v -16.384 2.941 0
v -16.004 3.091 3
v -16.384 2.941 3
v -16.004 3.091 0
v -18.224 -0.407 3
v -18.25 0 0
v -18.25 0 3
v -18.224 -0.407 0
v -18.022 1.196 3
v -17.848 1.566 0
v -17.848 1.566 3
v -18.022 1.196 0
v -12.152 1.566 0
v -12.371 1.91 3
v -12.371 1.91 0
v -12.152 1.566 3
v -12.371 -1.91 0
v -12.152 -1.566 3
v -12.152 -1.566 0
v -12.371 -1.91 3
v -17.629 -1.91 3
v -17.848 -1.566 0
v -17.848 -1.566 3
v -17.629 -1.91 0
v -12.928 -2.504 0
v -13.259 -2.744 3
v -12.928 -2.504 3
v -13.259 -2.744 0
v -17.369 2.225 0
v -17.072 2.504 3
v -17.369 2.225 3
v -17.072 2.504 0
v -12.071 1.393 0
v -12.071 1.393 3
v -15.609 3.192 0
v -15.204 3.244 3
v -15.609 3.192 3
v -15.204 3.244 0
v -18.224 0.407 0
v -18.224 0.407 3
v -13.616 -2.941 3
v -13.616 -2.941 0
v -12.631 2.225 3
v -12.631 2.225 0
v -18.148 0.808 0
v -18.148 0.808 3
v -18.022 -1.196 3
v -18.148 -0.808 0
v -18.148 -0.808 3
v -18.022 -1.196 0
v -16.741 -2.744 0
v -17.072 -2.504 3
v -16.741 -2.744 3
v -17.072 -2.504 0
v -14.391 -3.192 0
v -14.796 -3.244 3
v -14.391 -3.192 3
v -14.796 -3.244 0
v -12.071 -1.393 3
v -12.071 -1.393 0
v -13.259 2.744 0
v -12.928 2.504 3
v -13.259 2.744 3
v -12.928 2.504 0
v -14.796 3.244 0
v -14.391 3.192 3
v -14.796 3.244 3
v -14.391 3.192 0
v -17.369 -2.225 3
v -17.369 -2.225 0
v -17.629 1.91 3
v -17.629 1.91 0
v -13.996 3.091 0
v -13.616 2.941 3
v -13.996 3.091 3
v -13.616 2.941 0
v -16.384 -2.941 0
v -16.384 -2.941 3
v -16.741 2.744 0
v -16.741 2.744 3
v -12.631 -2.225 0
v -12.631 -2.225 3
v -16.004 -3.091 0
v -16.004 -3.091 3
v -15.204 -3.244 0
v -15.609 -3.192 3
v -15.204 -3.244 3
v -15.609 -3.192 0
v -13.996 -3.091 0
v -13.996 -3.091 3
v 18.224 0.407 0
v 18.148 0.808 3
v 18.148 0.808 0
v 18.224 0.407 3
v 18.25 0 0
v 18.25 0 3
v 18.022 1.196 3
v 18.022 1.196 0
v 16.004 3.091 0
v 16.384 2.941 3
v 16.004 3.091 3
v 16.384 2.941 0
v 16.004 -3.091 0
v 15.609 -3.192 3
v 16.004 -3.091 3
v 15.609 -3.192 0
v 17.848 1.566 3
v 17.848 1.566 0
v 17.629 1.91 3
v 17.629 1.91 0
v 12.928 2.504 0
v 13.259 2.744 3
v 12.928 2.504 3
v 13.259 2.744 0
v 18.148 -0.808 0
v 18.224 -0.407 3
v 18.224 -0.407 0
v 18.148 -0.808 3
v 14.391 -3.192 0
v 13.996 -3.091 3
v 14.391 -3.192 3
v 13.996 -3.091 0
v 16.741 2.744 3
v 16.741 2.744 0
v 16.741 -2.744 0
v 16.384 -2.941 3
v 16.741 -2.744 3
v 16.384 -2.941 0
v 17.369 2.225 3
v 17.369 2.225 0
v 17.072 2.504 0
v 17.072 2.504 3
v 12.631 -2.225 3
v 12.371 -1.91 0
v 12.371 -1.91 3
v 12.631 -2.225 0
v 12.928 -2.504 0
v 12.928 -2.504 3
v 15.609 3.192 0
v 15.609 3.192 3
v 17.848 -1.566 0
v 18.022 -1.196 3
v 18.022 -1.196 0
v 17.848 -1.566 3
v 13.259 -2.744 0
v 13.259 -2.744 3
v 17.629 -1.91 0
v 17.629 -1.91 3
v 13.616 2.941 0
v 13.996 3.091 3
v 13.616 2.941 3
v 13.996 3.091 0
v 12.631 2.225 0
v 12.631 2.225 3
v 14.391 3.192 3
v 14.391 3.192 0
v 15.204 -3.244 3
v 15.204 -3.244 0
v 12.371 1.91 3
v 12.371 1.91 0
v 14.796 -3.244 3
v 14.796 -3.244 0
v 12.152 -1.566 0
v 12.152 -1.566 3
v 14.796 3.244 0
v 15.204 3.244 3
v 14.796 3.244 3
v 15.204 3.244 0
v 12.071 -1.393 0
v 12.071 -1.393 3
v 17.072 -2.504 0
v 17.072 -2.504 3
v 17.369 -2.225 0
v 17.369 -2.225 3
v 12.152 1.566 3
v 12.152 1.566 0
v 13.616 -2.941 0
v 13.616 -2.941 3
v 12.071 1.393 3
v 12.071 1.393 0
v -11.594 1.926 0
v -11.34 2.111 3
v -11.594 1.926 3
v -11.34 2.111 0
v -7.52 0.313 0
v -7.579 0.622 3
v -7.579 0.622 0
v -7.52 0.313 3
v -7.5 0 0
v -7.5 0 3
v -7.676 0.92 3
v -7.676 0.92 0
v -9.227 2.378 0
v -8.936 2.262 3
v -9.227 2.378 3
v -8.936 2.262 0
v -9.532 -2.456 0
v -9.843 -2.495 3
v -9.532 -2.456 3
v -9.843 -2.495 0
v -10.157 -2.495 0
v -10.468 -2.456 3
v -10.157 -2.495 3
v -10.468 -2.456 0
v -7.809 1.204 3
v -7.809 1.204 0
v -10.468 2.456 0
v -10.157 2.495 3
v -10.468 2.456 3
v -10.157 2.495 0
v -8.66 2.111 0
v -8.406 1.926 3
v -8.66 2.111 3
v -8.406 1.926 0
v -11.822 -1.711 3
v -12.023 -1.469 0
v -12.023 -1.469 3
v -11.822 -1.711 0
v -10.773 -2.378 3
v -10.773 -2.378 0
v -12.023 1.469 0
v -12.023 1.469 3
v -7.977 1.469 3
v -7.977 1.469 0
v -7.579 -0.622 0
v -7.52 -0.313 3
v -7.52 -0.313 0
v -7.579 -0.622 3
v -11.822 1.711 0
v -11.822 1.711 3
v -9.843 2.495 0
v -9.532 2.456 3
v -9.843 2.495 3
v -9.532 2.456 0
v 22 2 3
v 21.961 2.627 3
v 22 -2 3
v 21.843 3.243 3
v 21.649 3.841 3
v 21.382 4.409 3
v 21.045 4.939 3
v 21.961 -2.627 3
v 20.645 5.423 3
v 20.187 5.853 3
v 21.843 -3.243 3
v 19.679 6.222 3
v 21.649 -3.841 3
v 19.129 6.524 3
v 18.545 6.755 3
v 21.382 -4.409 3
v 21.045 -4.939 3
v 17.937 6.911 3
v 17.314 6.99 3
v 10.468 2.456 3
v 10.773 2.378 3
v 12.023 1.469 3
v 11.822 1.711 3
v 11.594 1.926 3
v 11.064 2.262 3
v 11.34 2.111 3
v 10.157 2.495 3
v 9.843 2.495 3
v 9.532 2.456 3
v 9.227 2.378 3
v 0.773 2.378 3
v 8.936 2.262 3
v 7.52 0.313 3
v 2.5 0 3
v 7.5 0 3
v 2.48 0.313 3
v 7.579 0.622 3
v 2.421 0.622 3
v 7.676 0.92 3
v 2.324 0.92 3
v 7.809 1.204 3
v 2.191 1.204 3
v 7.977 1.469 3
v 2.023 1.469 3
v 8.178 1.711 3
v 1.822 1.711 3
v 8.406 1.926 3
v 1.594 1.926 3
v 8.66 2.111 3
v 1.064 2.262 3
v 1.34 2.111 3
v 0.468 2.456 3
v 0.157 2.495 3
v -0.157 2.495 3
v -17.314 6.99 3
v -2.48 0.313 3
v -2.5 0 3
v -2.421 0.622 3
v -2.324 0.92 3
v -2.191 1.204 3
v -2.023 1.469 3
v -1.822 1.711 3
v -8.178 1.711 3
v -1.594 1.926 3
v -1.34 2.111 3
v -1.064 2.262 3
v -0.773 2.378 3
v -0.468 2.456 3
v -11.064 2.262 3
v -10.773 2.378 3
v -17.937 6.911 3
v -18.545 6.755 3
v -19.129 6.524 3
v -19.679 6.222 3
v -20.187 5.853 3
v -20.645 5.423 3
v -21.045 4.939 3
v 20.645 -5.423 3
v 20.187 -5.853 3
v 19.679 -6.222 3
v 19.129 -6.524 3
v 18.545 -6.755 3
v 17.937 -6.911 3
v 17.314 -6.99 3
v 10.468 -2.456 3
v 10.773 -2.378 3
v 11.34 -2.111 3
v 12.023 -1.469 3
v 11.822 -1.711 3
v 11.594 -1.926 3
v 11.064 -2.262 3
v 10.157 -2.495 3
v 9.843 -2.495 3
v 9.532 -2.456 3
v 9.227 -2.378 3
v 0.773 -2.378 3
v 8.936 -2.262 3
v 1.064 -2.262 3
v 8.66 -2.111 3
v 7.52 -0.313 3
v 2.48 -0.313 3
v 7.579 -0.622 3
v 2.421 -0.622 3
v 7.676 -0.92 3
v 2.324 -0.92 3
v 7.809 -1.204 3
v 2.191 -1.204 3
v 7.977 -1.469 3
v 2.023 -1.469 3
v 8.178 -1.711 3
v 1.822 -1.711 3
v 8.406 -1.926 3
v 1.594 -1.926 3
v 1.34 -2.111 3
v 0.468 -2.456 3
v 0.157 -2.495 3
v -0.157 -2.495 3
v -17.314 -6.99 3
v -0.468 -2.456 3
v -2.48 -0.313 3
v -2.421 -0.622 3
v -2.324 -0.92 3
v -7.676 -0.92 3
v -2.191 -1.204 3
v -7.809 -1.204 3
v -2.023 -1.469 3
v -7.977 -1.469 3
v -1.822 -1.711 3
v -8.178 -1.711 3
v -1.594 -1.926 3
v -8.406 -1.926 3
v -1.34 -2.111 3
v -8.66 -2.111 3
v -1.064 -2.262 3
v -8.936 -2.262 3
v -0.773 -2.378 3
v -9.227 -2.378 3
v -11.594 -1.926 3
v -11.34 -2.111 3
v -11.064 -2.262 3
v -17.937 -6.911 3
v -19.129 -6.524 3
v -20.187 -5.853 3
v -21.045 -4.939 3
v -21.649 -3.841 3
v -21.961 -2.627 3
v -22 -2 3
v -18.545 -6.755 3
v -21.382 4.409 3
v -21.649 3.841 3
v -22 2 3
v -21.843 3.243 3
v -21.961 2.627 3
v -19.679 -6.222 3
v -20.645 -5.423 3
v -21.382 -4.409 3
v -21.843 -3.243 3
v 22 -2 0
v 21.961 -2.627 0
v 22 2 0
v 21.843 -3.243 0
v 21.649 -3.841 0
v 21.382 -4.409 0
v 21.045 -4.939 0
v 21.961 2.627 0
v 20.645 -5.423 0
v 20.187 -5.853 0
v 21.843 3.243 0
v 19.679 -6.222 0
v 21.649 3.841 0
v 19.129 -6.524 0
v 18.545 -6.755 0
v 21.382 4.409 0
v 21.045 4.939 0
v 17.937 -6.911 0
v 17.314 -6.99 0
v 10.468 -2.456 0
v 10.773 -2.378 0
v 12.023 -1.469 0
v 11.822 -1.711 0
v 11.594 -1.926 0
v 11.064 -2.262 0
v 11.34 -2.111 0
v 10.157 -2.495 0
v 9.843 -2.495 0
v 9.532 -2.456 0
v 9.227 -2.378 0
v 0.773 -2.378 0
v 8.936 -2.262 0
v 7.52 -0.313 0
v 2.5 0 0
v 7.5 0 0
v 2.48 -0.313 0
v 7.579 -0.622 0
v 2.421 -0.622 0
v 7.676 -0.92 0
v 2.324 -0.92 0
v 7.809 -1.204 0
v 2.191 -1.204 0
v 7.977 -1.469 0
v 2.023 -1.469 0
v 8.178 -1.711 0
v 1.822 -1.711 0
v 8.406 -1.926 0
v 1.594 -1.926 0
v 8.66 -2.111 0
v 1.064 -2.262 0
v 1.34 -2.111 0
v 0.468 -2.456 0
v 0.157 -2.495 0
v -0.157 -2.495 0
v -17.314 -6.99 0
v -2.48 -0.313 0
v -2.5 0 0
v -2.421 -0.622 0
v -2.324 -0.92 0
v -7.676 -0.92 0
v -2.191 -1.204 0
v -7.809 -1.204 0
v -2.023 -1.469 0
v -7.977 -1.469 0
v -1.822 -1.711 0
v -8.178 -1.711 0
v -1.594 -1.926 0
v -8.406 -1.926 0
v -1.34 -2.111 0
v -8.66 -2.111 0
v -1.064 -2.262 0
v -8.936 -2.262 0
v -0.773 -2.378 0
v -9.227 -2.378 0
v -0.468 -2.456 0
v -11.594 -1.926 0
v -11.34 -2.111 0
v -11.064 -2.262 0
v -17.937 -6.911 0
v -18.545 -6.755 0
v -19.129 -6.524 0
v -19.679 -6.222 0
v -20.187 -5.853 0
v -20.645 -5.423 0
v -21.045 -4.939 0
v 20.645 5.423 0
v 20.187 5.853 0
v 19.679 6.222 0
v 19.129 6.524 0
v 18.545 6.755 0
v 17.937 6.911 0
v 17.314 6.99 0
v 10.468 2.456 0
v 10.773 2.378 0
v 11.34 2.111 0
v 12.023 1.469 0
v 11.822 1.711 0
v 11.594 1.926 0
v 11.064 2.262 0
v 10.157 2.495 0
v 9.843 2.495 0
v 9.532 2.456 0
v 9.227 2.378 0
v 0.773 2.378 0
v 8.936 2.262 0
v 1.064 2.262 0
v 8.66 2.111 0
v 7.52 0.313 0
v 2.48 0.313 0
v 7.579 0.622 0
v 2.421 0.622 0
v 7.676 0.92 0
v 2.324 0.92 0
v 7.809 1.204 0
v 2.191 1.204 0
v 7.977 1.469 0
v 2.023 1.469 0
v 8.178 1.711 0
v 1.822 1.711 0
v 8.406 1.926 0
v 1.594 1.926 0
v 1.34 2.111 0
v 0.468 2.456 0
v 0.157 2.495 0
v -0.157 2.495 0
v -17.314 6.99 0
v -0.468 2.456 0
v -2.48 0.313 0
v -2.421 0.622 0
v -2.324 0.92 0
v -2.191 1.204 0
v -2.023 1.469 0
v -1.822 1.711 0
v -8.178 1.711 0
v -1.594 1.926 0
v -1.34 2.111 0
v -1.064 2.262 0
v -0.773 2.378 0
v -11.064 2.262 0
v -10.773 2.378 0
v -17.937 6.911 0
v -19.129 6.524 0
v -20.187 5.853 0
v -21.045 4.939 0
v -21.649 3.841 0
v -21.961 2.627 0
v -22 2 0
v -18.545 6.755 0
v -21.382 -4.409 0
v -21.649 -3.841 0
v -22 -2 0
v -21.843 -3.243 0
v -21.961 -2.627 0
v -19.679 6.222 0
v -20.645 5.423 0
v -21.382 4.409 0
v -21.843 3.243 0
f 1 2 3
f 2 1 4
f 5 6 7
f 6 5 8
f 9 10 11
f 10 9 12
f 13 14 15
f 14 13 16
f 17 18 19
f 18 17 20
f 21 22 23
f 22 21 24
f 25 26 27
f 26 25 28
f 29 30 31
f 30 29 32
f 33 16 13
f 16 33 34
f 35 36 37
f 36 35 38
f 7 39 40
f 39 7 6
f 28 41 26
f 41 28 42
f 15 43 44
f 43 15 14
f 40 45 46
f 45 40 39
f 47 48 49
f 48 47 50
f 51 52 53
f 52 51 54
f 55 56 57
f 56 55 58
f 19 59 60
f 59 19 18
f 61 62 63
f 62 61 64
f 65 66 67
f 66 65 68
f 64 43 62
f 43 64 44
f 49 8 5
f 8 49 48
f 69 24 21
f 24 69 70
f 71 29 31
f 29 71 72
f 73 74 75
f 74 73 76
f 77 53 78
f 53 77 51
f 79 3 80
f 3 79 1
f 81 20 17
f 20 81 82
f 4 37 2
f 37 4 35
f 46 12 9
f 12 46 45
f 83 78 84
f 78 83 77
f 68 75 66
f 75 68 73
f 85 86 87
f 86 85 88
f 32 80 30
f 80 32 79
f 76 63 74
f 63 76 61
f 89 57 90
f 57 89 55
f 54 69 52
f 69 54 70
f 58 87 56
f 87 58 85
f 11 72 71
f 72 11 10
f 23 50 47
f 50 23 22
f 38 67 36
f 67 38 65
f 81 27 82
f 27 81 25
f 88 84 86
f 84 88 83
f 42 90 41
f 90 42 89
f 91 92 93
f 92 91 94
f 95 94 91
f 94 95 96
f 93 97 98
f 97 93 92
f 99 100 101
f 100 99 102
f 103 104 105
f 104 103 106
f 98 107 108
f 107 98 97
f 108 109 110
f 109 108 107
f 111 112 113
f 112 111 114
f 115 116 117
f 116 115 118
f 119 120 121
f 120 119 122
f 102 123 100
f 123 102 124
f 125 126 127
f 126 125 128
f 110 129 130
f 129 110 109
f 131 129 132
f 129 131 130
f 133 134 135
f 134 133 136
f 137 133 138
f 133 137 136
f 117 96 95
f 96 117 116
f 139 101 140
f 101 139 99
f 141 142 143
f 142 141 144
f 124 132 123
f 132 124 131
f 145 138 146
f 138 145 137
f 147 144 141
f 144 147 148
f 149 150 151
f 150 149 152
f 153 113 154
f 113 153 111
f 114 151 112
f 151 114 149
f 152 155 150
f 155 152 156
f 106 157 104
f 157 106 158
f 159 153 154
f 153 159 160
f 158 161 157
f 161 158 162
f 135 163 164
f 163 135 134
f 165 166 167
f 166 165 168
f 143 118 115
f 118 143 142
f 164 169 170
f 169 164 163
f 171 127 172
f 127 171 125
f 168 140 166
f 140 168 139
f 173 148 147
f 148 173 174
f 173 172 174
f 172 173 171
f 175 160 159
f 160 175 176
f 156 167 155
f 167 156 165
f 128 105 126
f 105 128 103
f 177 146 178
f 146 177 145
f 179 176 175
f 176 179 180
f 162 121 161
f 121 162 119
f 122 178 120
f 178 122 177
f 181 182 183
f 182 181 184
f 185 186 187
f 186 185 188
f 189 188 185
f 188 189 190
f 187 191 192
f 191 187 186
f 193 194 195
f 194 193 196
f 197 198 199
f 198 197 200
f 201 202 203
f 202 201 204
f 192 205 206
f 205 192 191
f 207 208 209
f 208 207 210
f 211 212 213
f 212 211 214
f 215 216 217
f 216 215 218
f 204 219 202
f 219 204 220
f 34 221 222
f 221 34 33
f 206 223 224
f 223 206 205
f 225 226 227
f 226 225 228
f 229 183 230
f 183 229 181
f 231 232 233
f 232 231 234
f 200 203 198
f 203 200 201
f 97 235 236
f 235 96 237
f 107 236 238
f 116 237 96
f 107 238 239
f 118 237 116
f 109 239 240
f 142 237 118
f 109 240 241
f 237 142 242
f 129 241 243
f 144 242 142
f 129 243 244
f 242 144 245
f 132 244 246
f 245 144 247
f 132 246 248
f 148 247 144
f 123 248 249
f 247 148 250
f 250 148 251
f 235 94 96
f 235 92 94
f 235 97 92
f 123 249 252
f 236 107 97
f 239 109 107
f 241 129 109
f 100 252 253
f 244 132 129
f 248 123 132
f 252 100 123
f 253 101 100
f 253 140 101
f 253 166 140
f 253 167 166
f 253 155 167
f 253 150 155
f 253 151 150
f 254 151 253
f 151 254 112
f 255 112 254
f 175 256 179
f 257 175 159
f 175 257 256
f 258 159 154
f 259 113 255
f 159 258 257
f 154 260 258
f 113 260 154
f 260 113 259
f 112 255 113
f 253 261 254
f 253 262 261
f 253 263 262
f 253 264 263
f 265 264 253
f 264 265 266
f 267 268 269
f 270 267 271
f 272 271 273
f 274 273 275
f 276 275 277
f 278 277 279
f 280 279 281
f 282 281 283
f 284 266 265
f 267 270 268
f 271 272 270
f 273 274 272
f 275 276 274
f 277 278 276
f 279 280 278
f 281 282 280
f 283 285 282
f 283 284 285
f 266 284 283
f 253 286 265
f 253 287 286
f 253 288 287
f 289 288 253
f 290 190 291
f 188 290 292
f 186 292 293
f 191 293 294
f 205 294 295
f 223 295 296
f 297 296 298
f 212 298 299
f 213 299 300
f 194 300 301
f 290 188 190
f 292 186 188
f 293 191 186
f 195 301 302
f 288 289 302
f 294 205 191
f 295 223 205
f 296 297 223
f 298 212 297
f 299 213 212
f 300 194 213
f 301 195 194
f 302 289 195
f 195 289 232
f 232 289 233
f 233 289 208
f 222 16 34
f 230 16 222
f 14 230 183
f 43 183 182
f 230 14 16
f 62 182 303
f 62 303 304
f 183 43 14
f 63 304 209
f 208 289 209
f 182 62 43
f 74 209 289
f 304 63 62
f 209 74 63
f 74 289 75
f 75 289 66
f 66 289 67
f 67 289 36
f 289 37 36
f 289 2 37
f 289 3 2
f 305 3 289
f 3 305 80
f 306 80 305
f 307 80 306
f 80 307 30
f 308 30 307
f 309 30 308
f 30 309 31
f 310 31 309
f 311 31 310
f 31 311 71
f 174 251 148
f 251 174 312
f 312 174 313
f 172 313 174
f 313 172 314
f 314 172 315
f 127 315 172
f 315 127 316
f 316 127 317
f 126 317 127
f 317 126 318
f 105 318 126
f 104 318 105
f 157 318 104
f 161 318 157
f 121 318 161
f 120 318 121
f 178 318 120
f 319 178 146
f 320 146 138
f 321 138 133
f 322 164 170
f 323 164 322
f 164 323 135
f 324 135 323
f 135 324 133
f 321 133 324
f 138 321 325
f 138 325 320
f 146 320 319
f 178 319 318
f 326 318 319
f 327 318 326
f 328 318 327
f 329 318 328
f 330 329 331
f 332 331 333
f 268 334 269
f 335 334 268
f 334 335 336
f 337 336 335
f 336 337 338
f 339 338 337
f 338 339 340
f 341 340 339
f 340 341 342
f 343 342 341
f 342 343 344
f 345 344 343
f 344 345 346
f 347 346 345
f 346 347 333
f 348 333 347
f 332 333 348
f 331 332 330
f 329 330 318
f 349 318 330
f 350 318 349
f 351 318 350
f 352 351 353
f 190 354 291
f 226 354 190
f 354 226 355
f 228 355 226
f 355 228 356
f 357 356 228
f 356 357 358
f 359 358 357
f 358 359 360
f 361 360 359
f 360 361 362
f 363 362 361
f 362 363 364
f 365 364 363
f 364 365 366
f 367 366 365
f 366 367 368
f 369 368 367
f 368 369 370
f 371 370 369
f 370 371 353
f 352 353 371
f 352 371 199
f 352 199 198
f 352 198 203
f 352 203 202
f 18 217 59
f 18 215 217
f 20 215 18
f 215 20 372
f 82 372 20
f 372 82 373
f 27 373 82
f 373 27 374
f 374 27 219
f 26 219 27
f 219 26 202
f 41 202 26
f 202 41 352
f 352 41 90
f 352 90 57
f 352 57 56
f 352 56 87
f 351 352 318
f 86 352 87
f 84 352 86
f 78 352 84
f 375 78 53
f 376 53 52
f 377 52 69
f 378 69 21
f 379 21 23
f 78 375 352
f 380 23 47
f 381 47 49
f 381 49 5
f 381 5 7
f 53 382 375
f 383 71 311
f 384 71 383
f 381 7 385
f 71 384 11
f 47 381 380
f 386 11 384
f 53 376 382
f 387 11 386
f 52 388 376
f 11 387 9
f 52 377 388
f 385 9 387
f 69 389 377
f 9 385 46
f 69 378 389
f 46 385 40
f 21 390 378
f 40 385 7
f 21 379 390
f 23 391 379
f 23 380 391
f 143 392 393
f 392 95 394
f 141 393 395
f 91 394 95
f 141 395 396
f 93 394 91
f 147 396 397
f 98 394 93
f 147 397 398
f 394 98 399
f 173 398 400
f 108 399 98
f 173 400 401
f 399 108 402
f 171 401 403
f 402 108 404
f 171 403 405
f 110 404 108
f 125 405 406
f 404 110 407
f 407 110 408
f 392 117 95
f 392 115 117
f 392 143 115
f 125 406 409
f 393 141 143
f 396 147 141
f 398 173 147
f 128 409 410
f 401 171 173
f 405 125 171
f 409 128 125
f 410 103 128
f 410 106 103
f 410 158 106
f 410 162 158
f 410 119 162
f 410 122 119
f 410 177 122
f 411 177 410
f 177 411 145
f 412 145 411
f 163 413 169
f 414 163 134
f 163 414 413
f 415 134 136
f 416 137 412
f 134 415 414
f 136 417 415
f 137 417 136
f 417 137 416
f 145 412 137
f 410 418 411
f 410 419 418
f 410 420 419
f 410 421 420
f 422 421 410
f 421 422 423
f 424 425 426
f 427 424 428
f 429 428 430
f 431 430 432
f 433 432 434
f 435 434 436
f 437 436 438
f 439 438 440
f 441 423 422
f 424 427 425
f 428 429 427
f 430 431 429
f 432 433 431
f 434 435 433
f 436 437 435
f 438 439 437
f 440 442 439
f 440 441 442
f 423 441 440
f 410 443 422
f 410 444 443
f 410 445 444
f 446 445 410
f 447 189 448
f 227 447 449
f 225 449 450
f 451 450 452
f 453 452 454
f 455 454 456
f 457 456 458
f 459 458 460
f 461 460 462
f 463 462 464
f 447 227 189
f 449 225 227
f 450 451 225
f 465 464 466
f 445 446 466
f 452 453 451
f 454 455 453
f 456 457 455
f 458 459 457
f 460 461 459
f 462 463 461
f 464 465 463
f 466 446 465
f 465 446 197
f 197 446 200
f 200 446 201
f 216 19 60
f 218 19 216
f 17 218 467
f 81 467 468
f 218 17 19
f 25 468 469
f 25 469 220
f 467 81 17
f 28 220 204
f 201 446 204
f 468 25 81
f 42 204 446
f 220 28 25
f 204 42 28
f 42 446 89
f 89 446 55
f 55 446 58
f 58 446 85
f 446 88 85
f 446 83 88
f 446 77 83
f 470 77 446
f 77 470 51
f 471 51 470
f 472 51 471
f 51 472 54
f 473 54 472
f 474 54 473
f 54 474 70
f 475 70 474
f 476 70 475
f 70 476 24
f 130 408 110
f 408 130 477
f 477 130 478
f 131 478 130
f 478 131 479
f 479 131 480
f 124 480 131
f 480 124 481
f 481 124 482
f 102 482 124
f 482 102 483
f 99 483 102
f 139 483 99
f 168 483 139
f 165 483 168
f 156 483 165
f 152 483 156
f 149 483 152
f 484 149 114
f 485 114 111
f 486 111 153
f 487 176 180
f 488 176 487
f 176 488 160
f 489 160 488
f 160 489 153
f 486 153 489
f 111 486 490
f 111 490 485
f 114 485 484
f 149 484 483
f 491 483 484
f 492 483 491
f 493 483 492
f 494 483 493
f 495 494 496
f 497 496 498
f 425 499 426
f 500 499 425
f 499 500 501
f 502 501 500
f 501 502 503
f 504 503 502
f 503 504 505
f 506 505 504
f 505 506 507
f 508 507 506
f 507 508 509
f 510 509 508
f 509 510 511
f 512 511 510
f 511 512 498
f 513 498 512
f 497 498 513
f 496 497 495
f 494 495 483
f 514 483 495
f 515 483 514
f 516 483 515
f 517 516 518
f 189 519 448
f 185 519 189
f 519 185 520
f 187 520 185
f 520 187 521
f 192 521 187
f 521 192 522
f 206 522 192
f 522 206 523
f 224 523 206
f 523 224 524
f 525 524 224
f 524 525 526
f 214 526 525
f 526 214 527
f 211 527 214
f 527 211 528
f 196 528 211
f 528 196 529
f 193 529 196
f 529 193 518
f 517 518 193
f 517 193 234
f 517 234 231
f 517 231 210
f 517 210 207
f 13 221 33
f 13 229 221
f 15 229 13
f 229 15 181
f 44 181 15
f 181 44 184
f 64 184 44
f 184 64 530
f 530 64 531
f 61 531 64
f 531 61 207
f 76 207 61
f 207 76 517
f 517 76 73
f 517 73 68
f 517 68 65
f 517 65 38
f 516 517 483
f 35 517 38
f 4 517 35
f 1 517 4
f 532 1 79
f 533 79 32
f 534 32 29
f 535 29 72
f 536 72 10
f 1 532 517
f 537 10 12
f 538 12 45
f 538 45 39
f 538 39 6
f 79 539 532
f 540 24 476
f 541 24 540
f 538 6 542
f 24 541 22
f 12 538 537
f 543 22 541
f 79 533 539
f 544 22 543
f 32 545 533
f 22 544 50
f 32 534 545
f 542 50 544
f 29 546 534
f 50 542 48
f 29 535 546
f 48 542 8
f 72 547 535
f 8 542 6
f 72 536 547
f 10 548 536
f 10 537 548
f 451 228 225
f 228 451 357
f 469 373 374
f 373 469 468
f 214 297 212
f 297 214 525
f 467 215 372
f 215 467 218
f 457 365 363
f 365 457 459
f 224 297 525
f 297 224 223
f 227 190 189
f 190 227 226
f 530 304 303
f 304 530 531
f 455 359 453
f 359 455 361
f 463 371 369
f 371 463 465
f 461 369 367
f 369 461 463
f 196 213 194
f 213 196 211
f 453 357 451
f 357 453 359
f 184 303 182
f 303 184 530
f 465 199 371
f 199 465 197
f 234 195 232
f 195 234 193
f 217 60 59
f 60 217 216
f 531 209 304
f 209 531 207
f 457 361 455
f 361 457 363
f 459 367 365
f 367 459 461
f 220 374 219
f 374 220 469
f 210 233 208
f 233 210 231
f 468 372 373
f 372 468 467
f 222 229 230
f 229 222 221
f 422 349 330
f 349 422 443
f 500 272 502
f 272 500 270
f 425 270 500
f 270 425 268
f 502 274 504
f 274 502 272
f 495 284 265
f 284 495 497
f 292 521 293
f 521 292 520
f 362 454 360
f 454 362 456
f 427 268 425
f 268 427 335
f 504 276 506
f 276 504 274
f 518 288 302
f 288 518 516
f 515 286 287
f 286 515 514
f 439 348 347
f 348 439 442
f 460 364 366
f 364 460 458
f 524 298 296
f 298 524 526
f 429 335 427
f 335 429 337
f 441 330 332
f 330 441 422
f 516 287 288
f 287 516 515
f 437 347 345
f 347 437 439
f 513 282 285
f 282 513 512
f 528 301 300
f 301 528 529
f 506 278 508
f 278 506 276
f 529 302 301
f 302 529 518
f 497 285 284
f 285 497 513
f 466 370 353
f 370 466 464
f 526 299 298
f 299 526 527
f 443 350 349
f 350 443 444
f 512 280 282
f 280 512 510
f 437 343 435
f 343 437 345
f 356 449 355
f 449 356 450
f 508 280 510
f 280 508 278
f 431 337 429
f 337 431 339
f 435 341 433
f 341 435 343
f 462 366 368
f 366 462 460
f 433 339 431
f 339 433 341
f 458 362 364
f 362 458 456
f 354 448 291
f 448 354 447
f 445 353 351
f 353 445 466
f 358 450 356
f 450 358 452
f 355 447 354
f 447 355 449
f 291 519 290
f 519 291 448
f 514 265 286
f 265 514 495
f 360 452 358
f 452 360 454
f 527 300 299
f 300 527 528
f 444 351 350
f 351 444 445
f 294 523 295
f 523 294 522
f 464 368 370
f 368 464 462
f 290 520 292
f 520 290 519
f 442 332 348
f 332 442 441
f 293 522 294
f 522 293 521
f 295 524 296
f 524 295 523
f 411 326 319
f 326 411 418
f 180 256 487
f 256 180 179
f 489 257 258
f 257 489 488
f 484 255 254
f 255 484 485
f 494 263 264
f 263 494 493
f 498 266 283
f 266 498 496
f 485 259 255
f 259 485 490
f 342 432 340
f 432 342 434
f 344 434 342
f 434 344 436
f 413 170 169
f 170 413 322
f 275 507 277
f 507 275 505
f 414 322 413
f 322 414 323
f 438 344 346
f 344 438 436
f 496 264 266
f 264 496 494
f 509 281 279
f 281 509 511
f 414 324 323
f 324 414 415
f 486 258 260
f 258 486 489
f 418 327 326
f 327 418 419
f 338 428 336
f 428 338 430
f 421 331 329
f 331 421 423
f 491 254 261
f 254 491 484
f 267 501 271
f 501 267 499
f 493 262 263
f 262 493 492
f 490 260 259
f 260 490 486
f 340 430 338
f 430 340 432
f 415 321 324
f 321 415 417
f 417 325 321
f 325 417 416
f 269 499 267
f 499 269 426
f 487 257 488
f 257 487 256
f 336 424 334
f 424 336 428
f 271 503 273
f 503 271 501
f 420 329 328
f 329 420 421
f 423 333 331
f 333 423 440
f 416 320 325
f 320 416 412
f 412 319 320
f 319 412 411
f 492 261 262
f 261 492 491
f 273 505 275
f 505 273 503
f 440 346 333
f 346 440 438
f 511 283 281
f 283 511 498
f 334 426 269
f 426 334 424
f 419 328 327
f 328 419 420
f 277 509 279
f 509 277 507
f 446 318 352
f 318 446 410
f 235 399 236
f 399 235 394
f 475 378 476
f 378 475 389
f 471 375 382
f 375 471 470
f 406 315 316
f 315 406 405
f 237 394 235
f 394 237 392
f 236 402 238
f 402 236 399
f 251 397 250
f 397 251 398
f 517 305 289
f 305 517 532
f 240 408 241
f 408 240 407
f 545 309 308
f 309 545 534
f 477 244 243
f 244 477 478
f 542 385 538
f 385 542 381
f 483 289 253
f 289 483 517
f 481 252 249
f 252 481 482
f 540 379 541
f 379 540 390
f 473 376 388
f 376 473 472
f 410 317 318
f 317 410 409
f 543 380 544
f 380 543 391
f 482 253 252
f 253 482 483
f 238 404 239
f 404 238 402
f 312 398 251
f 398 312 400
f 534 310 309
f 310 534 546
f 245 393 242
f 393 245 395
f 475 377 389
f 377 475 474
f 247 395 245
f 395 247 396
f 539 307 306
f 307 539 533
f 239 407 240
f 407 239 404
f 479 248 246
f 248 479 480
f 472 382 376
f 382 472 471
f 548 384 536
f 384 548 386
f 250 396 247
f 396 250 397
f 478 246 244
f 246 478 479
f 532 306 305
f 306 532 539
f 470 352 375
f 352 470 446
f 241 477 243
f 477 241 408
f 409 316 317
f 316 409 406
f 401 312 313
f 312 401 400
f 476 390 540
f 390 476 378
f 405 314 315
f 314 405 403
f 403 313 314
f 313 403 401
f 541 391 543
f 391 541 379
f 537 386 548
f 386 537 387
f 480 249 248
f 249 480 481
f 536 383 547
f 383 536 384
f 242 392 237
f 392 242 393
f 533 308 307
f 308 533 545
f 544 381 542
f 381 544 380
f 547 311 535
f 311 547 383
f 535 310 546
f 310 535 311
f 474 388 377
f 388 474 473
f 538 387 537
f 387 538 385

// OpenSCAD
$fn = 50;


difference() {
	union() {
		hull() {
			translate(v = [-17.0000000000, 2.0000000000, 0]) {
				cylinder(h = 3, r = 5);
			}
			translate(v = [17.0000000000, 2.0000000000, 0]) {
				cylinder(h = 3, r = 5);
			}
			translate(v = [-17.0000000000, -2.0000000000, 0]) {
				cylinder(h = 3, r = 5);
			}
			translate(v = [17.0000000000, -2.0000000000, 0]) {
				cylinder(h = 3, r = 5);
			}
		}
	}
	union() {
		#translate(v = [-15.0000000000, 0.0000000000, -100.0000000000]) {
			cylinder(h = 200, r = 3.2500000000);
		}
		#translate(v = [-15.0000000000, 0.0000000000, -100.0000000000]) {
			cylinder(h = 200, r = 3.2500000000);
		}
		#translate(v = [15.0000000000, 0.0000000000, -100.0000000000]) {
			cylinder(h = 200, r = 3.2500000000);
		}
		#translate(v = [15.0000000000, 0.0000000000, -100.0000000000]) {
			cylinder(h = 200, r = 3.2500000000);
		}
		#translate(v = [-10.0000000000, 0, 0]) {
			cylinder(h = 3, r = 2.5000000000);
		}
		#cylinder(h = 3, r = 2.5000000000);
		#translate(v = [10.0000000000, 0, 0]) {
			cylinder(h = 3, r = 2.5000000000);
		}
	}
}
